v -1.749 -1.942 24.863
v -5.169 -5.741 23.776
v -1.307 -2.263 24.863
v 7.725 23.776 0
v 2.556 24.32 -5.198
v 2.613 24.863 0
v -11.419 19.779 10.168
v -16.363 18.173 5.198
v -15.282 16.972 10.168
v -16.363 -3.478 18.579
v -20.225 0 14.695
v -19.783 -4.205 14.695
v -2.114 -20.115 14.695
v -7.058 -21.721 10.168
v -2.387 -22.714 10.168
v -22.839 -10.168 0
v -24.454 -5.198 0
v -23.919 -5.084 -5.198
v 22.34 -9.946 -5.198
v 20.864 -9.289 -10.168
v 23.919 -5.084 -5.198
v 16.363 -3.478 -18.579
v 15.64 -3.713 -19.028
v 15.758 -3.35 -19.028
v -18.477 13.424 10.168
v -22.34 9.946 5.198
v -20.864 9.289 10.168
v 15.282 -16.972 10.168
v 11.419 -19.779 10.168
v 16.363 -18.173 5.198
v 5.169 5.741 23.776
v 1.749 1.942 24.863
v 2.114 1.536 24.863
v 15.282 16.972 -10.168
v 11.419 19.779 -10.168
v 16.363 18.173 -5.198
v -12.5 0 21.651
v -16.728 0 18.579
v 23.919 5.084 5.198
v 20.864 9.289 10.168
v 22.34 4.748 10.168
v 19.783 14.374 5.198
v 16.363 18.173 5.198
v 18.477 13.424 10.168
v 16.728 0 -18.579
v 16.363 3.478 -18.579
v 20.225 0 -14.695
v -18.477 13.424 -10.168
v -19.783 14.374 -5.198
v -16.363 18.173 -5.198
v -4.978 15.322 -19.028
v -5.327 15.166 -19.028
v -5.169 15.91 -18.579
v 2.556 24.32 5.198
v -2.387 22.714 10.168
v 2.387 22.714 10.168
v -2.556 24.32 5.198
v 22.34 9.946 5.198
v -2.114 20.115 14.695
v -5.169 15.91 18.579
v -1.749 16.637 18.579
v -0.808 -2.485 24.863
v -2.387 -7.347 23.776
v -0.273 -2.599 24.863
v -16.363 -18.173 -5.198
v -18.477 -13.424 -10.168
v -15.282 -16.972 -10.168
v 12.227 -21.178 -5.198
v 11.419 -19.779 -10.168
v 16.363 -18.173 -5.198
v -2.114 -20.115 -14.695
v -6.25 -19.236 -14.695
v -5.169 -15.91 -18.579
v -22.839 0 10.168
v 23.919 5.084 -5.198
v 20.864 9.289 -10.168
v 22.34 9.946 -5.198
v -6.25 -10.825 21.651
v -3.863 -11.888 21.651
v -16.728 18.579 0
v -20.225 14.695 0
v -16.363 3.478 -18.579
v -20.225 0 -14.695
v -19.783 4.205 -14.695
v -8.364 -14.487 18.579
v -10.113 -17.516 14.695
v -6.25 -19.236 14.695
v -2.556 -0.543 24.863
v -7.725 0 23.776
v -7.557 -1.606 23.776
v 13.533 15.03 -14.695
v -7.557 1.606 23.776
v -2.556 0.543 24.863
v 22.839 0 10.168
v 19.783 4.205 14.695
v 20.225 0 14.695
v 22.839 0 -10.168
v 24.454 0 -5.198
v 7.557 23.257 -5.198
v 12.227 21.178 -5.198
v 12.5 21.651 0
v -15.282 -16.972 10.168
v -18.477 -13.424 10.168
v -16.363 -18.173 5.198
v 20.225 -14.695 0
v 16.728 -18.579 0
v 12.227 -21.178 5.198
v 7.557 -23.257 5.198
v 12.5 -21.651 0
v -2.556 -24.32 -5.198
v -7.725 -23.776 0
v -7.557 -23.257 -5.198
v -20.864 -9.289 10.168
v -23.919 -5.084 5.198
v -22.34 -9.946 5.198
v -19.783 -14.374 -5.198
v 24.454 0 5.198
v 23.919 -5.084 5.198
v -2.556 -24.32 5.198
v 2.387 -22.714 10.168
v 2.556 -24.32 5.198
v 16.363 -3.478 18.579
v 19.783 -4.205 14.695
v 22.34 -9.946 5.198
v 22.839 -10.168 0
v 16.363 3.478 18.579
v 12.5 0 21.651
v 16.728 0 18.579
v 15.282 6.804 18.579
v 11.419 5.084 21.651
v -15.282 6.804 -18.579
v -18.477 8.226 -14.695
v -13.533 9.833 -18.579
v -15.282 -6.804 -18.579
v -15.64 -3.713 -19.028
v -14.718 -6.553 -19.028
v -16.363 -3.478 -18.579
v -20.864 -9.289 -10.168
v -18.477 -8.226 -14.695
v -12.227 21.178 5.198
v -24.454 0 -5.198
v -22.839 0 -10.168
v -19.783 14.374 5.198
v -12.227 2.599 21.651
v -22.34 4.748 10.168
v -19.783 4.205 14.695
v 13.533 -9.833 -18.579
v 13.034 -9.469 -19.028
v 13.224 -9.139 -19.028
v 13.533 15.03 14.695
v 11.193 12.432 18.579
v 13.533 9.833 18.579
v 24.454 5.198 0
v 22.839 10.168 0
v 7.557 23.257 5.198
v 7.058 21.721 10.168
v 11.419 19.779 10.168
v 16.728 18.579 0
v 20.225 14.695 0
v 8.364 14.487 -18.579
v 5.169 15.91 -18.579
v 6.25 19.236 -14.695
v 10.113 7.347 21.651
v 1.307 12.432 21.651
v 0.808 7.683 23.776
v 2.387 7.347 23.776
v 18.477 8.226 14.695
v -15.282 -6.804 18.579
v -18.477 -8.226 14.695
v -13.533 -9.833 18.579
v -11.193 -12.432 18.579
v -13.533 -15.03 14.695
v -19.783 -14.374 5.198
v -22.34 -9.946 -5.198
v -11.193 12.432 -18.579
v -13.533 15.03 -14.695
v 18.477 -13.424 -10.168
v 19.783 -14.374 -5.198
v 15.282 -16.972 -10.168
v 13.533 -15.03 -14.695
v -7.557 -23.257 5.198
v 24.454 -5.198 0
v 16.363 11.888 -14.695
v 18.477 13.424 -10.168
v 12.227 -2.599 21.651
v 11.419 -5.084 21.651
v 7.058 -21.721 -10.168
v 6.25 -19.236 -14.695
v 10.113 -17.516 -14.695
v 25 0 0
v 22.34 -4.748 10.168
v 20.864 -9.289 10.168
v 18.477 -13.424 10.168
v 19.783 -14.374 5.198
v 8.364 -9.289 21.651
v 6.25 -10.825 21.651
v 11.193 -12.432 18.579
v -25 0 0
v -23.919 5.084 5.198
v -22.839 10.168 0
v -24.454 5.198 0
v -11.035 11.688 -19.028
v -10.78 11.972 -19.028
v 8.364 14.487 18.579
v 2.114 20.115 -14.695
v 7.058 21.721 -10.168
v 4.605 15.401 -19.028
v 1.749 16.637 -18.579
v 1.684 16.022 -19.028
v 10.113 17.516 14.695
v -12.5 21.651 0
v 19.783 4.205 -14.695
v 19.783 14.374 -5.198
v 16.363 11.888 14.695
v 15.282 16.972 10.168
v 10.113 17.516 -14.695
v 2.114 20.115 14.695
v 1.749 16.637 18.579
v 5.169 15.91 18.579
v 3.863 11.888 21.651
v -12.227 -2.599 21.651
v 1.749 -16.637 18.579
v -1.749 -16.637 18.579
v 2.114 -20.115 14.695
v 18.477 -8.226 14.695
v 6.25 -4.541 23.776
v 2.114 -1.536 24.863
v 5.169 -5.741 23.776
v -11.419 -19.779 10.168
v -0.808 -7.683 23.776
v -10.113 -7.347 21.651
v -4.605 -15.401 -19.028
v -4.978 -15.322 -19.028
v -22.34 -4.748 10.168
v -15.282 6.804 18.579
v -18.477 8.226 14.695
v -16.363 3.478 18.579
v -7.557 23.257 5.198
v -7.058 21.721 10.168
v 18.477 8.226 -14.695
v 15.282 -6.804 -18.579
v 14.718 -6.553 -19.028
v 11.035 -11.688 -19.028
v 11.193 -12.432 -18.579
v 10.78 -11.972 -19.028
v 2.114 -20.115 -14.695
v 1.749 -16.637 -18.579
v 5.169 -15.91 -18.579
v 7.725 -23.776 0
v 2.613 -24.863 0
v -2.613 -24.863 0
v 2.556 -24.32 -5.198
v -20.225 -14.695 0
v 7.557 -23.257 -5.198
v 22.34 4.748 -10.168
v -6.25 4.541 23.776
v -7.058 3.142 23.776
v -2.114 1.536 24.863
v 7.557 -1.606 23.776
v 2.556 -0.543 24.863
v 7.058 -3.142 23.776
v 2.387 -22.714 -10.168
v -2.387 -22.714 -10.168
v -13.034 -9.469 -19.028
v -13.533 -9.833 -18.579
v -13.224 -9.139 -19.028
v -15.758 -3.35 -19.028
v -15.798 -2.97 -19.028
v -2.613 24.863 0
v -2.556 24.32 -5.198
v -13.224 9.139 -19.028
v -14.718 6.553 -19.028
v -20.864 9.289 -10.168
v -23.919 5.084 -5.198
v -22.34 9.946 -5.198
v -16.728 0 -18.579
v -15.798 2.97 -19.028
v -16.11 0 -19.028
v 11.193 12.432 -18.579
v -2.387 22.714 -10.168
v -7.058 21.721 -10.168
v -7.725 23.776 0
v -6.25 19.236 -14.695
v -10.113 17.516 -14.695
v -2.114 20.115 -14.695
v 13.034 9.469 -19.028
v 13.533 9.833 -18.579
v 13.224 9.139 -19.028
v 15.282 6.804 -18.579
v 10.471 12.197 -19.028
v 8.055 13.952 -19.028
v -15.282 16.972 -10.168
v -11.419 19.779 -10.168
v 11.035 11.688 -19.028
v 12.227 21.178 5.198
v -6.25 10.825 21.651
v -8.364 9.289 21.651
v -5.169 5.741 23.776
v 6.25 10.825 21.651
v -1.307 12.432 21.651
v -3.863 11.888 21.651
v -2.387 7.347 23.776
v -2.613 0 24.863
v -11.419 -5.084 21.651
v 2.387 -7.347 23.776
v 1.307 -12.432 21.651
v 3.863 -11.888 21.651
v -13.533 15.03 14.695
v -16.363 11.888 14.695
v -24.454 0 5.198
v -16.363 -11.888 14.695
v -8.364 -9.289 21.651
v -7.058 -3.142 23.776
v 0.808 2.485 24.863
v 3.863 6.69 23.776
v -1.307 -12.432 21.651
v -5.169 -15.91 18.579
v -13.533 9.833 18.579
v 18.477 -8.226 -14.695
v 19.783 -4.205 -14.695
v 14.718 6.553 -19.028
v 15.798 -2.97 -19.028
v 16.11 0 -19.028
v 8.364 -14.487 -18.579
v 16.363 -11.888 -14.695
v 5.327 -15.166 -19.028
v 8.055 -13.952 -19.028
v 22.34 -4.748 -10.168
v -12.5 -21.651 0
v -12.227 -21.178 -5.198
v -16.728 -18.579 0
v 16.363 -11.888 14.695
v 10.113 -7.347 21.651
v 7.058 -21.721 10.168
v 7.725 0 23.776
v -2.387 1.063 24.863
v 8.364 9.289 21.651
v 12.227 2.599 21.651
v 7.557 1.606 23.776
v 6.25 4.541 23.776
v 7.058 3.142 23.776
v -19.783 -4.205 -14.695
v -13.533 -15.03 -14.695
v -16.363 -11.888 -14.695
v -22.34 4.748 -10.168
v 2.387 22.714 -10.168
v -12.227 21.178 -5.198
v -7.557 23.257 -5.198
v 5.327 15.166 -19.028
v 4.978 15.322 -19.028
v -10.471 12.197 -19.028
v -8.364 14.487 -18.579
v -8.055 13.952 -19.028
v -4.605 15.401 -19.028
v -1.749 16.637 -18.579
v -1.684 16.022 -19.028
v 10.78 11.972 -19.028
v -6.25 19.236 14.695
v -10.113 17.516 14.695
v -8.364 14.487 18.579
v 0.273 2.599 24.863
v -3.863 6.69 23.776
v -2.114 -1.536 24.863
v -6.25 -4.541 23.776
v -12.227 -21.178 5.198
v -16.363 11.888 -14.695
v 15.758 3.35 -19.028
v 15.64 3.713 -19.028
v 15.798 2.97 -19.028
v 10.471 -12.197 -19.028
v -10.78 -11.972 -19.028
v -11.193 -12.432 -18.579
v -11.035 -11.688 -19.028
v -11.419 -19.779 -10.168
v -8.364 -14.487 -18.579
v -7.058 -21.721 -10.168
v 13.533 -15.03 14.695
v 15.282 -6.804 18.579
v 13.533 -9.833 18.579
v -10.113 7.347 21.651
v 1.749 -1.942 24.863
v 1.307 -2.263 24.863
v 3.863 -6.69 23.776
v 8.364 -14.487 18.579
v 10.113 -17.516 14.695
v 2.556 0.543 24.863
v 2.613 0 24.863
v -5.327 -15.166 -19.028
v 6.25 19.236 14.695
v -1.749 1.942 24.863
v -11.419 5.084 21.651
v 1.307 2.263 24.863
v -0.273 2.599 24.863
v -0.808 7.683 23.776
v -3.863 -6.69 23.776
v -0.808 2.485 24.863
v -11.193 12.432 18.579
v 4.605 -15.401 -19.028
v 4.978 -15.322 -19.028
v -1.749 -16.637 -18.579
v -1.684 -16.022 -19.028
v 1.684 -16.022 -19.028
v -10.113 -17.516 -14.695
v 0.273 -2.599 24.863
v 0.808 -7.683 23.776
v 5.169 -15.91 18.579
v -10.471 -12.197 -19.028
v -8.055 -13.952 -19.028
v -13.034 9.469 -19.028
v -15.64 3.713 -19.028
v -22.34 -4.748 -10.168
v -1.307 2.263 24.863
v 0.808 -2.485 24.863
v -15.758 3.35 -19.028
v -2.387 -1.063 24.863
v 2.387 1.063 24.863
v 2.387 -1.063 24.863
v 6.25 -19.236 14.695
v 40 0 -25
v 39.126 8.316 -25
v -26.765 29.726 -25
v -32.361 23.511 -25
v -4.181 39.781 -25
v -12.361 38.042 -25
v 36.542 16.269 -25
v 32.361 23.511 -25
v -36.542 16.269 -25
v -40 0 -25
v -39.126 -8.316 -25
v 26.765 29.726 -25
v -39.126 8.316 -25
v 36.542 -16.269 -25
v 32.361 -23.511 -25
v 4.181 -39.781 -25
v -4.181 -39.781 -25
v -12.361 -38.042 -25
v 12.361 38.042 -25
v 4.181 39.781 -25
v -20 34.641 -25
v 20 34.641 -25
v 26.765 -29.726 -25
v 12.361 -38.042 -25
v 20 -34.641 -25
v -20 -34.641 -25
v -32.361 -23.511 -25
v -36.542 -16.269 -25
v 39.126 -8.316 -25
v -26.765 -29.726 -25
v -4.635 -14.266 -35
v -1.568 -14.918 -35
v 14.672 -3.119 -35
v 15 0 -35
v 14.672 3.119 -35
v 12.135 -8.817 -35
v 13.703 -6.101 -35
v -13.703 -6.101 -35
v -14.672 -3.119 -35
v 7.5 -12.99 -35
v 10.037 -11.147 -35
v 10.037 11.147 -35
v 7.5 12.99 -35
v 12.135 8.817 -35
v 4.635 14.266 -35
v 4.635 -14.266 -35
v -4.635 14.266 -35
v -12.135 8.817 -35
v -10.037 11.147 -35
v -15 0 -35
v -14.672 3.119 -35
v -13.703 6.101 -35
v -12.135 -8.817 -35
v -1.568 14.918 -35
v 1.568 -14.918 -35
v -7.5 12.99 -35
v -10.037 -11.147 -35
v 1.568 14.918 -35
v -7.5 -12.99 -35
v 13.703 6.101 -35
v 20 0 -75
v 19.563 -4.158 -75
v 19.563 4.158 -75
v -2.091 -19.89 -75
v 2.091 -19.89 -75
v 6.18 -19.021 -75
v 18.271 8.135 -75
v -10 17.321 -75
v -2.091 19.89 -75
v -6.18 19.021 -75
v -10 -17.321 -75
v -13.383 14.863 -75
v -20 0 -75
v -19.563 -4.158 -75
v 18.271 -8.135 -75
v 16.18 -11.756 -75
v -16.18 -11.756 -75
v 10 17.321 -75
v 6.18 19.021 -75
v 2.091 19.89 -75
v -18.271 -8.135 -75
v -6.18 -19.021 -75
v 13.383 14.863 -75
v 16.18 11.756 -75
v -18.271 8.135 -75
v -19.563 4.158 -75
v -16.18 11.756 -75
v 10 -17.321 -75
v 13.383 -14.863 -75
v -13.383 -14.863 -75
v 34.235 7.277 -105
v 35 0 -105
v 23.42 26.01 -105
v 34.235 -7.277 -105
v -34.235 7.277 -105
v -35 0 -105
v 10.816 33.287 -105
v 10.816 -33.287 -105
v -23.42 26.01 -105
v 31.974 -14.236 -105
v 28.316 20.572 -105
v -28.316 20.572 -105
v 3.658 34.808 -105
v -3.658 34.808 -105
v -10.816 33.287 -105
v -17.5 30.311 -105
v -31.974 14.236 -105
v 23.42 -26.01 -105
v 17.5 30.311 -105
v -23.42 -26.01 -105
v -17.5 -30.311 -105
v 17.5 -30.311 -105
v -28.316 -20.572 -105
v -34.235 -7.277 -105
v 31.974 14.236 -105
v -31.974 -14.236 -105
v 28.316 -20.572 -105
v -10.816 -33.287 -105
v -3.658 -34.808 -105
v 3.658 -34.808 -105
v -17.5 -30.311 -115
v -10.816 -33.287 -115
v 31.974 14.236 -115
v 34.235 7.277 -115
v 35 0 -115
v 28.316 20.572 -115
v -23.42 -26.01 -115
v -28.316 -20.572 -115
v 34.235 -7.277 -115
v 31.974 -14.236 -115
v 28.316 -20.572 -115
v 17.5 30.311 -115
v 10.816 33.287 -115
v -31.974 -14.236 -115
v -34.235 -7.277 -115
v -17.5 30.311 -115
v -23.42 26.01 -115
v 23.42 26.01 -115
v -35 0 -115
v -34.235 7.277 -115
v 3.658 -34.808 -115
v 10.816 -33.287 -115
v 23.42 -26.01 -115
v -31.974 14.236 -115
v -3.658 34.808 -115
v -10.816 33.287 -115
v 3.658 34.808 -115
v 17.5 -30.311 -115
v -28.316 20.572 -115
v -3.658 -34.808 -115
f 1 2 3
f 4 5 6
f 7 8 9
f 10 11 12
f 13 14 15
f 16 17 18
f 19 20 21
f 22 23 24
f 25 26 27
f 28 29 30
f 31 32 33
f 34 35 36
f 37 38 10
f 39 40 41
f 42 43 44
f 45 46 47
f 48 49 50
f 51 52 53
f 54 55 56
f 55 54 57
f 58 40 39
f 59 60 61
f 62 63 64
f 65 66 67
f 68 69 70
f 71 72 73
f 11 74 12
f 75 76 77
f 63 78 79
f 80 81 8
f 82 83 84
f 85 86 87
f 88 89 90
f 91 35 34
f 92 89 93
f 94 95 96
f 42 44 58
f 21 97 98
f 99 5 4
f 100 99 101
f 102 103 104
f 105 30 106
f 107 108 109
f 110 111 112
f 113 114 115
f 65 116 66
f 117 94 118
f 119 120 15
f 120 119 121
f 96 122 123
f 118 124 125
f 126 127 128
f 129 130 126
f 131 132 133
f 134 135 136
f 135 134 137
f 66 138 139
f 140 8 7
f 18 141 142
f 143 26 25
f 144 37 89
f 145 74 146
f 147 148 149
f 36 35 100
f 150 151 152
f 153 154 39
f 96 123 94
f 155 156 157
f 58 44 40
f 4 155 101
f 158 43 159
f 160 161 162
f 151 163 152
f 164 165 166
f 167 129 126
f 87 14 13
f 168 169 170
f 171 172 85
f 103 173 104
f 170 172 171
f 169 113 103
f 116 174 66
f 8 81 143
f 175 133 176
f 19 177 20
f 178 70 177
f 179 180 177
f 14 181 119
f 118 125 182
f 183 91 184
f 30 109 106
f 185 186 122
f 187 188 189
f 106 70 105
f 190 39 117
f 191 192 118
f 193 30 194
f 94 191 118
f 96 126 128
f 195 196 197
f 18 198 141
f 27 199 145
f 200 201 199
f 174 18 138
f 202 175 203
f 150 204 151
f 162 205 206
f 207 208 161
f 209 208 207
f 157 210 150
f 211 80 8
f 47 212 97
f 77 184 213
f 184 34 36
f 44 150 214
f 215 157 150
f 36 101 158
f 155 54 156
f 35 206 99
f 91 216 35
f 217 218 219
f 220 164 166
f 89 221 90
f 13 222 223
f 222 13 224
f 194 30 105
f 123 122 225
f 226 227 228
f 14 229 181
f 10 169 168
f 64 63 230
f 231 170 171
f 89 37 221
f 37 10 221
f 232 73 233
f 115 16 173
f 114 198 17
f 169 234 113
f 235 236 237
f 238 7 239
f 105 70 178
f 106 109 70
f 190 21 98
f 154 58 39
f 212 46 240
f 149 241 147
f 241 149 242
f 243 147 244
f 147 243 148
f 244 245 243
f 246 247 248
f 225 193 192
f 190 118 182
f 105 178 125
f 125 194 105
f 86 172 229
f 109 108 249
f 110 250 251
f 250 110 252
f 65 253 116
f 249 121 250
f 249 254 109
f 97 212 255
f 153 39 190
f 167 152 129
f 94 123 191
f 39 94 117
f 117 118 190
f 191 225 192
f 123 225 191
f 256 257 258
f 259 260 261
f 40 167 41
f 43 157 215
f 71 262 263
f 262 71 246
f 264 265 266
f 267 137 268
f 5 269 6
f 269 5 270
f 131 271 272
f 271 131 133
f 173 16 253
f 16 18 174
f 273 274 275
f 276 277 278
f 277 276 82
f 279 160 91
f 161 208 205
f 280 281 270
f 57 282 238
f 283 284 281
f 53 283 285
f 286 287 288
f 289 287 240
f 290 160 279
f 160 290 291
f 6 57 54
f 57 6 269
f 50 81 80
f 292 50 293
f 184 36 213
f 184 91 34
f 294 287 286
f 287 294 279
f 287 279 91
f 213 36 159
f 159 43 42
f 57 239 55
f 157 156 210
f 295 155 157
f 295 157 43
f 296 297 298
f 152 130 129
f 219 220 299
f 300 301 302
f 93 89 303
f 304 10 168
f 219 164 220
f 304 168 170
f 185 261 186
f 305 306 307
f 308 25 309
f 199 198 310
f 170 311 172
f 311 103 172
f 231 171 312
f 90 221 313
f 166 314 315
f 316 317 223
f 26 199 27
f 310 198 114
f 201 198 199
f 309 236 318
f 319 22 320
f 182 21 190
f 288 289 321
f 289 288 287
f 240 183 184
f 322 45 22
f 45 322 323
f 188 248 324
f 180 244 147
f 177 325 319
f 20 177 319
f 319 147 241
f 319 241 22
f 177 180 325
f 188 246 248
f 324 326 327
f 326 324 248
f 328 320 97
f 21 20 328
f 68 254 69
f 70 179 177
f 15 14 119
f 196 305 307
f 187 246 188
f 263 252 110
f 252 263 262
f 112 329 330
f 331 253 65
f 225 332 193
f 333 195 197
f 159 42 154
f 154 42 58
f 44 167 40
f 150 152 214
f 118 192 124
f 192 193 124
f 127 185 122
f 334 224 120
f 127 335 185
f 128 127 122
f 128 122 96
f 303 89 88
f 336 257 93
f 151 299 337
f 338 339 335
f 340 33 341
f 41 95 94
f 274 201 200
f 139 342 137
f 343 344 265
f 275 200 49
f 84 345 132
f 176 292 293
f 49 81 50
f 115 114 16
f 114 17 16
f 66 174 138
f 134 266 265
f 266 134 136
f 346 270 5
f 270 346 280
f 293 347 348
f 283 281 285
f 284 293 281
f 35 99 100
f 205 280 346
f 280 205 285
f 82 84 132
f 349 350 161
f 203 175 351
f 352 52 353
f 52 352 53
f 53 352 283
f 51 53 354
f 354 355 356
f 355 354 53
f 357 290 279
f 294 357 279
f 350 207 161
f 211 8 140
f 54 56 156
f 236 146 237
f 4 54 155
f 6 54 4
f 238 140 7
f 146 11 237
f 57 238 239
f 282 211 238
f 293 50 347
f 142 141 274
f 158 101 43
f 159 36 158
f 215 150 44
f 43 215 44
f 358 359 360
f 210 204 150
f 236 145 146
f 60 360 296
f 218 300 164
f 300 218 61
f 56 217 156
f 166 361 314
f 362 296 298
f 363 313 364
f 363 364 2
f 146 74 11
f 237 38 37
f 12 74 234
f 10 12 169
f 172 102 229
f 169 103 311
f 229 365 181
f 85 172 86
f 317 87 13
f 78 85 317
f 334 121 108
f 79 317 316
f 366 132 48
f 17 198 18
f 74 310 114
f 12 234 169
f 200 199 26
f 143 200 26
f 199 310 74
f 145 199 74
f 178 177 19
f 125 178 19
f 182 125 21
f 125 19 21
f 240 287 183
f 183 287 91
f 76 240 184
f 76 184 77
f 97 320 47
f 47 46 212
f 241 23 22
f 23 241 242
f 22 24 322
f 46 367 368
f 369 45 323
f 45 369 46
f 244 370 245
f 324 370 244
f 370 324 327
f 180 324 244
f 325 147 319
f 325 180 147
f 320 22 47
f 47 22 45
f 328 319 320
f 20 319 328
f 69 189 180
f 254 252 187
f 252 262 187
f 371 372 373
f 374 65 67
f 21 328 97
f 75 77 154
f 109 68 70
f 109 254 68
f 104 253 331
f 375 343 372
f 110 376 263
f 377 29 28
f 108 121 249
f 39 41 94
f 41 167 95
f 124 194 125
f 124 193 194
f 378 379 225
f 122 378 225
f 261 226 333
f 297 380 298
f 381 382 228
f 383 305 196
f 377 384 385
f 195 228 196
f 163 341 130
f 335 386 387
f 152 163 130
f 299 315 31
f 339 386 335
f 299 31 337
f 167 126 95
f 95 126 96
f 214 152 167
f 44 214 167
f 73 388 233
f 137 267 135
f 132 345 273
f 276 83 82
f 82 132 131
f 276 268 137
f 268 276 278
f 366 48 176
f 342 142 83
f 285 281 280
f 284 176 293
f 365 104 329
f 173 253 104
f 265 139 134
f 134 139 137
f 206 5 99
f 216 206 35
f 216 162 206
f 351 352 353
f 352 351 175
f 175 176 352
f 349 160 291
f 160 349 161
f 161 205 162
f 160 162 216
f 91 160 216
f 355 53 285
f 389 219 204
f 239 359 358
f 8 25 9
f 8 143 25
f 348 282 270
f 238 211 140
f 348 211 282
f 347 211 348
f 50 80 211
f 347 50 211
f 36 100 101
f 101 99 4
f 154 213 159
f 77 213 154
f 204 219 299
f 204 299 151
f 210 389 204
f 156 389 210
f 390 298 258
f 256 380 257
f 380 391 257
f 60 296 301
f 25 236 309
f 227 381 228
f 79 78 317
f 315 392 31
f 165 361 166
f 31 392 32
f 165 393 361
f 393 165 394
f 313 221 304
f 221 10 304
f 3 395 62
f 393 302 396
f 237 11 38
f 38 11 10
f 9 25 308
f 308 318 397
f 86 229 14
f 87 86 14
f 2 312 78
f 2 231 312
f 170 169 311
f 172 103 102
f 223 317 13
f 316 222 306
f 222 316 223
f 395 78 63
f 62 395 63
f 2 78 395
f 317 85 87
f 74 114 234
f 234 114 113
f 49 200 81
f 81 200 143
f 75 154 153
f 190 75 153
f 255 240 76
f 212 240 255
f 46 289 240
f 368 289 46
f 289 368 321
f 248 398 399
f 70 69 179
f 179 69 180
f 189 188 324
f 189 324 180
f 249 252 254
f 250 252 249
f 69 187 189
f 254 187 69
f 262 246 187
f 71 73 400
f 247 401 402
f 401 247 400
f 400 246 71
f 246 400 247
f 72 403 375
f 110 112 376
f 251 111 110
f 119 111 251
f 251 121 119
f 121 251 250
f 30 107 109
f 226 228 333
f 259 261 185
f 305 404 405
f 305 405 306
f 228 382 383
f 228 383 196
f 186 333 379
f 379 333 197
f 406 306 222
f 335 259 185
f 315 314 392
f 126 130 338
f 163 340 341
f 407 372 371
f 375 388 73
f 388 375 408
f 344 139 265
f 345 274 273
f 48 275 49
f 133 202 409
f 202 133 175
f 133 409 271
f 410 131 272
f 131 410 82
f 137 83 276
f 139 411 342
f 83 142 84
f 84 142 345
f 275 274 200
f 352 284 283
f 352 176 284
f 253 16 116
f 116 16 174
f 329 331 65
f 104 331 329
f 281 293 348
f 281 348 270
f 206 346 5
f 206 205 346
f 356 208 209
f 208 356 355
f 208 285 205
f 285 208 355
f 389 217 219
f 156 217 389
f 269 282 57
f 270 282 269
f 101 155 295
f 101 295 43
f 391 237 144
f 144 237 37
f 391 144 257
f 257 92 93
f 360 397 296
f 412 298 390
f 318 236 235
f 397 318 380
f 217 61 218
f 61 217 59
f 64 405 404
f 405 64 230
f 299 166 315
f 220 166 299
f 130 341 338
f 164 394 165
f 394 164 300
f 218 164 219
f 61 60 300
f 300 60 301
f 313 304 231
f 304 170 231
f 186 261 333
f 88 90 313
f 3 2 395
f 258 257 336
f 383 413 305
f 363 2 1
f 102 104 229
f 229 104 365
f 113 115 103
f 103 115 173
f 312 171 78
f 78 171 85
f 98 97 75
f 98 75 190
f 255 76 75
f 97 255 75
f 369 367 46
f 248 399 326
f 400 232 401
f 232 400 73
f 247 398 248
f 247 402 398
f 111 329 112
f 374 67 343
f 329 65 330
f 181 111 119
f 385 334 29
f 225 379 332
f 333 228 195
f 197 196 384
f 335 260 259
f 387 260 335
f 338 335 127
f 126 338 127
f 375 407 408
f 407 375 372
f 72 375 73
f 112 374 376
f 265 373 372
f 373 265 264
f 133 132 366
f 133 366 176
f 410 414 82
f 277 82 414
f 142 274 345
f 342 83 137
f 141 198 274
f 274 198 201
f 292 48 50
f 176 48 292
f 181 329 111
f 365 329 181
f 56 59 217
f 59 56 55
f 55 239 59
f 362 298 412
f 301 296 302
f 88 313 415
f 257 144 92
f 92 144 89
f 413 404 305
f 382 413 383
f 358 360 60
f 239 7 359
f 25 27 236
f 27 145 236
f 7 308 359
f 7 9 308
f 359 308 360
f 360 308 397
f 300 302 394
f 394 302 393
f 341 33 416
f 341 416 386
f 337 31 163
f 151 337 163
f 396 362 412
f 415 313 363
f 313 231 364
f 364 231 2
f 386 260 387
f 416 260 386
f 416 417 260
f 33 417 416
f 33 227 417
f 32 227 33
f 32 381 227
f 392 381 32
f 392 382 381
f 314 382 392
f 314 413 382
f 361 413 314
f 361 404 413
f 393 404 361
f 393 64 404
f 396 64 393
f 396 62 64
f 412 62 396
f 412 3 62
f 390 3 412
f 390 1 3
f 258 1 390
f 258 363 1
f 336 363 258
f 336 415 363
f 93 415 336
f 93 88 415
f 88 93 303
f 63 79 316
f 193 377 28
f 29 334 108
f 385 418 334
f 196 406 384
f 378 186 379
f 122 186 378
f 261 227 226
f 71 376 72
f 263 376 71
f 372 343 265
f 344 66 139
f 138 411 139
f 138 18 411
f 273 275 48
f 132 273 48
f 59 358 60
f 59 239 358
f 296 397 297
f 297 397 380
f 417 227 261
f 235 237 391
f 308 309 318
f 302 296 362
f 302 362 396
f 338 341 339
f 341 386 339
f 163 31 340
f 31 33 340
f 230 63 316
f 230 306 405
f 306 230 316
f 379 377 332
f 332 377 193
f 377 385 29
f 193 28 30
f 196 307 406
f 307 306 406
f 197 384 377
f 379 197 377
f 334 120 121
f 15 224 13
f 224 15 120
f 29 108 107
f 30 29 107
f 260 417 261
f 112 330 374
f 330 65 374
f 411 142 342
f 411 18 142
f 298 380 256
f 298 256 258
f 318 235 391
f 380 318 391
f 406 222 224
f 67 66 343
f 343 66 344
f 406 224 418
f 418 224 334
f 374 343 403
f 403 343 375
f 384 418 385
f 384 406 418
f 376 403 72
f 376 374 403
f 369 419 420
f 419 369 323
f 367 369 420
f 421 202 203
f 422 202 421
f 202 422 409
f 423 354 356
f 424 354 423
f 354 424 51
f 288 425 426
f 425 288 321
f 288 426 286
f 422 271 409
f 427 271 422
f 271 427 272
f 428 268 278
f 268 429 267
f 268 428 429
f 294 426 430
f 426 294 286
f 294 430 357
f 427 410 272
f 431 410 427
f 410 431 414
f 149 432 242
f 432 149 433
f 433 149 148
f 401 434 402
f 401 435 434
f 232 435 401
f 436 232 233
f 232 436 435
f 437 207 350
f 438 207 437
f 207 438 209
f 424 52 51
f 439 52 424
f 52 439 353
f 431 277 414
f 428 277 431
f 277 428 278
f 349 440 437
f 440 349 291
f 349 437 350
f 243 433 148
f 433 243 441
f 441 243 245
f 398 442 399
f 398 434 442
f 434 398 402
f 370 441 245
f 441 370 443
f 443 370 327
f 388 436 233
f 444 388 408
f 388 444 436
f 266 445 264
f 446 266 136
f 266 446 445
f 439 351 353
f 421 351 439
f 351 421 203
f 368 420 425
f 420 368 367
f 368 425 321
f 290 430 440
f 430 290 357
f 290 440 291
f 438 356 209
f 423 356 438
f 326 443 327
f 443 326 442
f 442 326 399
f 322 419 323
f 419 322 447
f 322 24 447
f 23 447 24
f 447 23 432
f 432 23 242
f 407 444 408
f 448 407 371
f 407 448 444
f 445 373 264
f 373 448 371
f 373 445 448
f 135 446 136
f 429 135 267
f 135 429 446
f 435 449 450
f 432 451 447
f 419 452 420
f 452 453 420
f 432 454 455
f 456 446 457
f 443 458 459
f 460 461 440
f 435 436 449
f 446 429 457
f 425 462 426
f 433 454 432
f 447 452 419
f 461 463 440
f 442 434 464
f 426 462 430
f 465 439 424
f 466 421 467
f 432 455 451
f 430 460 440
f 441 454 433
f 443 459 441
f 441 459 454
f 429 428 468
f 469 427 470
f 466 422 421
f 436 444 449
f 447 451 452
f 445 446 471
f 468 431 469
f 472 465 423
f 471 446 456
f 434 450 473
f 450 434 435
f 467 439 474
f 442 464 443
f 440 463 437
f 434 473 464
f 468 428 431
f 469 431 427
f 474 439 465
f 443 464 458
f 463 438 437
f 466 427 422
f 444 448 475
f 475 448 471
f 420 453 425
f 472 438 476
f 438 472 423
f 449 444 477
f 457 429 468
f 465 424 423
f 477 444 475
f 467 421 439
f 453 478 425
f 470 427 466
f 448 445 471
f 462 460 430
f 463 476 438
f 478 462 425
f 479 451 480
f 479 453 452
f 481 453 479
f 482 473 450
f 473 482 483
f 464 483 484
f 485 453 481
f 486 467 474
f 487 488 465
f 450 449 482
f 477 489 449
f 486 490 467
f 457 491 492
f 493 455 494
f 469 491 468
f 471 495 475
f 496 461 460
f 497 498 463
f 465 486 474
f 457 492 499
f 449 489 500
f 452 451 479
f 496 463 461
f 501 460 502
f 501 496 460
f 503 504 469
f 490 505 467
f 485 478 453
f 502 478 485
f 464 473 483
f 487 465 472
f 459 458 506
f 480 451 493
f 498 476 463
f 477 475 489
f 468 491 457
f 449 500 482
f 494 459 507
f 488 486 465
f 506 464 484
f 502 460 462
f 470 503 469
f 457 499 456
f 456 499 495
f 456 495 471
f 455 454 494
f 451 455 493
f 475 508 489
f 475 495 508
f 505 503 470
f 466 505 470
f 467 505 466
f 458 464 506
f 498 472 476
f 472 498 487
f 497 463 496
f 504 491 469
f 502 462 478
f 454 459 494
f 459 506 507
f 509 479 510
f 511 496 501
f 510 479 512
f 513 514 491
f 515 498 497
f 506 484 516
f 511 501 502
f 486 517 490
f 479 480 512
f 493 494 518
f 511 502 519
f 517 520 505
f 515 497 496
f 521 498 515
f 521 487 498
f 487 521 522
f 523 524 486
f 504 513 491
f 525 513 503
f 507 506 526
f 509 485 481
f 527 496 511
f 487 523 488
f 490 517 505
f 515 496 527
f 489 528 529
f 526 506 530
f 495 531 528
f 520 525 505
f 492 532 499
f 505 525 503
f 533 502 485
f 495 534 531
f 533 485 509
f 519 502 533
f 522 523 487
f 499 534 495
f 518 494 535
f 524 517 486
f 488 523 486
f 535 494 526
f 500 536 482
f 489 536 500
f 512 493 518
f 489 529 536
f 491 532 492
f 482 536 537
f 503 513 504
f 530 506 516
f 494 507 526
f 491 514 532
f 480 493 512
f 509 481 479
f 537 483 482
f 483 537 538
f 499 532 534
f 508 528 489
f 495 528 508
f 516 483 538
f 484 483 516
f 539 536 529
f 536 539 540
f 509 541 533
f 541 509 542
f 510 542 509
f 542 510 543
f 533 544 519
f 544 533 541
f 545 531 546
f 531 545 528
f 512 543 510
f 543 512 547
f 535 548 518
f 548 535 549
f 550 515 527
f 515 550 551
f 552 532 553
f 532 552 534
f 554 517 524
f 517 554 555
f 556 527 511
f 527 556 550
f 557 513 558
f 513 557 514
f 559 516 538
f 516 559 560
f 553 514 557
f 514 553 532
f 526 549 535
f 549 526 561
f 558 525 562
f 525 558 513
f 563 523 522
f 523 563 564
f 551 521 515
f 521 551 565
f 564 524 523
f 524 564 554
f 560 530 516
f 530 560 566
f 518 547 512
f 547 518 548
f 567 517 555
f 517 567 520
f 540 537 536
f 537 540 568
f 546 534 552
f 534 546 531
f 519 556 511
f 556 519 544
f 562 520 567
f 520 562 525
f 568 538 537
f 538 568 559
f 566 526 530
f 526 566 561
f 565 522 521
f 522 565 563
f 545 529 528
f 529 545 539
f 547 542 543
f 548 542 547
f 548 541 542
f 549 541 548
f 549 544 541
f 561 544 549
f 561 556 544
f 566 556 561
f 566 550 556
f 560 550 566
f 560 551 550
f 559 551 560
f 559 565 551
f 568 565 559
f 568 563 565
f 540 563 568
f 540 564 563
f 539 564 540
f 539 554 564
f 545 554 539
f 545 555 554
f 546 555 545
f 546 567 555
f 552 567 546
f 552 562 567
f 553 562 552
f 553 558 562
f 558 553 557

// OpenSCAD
// Change any of these!
headWidth = 50;
collarHeight = 10;
collar1Width = 80;
collar2Width = 30;
bodyHeight = 40;
bodyWidth = 40;
legHeight = 30;
baseWidth = 70;
baseHeight = 10;

// The head
sphere(headWidth/2);

// The collar-looking thing
translate([0, 0, -1*headWidth/2]) 
cylinder(h=collarHeight, r1 = collar1Width/2, r2 = 0);

translate([0, 0, -1*headWidth/2-collarHeight]) 
cylinder(h=collarHeight, r1 = collar2Width/2, r2 = collar1Width/2);

// The body-looking thing
translate([0, 0, -1*headWidth/2-collarHeight-bodyHeight]) 
cylinder(h=bodyHeight, r1= bodyWidth/2, r2= collar2Width/2);

// The leg
translate([0, 0, -1*headWidth/2-collarHeight-bodyHeight-legHeight]) 
cylinder(h=legHeight, r1= baseWidth/2, r2= bodyWidth/2);

// The base
translate([0, 0, -1*headWidth/2-collarHeight-bodyHeight-legHeight-baseHeight]) 
cylinder(h=baseHeight, r1= baseWidth/2, r2= baseWidth/2);
